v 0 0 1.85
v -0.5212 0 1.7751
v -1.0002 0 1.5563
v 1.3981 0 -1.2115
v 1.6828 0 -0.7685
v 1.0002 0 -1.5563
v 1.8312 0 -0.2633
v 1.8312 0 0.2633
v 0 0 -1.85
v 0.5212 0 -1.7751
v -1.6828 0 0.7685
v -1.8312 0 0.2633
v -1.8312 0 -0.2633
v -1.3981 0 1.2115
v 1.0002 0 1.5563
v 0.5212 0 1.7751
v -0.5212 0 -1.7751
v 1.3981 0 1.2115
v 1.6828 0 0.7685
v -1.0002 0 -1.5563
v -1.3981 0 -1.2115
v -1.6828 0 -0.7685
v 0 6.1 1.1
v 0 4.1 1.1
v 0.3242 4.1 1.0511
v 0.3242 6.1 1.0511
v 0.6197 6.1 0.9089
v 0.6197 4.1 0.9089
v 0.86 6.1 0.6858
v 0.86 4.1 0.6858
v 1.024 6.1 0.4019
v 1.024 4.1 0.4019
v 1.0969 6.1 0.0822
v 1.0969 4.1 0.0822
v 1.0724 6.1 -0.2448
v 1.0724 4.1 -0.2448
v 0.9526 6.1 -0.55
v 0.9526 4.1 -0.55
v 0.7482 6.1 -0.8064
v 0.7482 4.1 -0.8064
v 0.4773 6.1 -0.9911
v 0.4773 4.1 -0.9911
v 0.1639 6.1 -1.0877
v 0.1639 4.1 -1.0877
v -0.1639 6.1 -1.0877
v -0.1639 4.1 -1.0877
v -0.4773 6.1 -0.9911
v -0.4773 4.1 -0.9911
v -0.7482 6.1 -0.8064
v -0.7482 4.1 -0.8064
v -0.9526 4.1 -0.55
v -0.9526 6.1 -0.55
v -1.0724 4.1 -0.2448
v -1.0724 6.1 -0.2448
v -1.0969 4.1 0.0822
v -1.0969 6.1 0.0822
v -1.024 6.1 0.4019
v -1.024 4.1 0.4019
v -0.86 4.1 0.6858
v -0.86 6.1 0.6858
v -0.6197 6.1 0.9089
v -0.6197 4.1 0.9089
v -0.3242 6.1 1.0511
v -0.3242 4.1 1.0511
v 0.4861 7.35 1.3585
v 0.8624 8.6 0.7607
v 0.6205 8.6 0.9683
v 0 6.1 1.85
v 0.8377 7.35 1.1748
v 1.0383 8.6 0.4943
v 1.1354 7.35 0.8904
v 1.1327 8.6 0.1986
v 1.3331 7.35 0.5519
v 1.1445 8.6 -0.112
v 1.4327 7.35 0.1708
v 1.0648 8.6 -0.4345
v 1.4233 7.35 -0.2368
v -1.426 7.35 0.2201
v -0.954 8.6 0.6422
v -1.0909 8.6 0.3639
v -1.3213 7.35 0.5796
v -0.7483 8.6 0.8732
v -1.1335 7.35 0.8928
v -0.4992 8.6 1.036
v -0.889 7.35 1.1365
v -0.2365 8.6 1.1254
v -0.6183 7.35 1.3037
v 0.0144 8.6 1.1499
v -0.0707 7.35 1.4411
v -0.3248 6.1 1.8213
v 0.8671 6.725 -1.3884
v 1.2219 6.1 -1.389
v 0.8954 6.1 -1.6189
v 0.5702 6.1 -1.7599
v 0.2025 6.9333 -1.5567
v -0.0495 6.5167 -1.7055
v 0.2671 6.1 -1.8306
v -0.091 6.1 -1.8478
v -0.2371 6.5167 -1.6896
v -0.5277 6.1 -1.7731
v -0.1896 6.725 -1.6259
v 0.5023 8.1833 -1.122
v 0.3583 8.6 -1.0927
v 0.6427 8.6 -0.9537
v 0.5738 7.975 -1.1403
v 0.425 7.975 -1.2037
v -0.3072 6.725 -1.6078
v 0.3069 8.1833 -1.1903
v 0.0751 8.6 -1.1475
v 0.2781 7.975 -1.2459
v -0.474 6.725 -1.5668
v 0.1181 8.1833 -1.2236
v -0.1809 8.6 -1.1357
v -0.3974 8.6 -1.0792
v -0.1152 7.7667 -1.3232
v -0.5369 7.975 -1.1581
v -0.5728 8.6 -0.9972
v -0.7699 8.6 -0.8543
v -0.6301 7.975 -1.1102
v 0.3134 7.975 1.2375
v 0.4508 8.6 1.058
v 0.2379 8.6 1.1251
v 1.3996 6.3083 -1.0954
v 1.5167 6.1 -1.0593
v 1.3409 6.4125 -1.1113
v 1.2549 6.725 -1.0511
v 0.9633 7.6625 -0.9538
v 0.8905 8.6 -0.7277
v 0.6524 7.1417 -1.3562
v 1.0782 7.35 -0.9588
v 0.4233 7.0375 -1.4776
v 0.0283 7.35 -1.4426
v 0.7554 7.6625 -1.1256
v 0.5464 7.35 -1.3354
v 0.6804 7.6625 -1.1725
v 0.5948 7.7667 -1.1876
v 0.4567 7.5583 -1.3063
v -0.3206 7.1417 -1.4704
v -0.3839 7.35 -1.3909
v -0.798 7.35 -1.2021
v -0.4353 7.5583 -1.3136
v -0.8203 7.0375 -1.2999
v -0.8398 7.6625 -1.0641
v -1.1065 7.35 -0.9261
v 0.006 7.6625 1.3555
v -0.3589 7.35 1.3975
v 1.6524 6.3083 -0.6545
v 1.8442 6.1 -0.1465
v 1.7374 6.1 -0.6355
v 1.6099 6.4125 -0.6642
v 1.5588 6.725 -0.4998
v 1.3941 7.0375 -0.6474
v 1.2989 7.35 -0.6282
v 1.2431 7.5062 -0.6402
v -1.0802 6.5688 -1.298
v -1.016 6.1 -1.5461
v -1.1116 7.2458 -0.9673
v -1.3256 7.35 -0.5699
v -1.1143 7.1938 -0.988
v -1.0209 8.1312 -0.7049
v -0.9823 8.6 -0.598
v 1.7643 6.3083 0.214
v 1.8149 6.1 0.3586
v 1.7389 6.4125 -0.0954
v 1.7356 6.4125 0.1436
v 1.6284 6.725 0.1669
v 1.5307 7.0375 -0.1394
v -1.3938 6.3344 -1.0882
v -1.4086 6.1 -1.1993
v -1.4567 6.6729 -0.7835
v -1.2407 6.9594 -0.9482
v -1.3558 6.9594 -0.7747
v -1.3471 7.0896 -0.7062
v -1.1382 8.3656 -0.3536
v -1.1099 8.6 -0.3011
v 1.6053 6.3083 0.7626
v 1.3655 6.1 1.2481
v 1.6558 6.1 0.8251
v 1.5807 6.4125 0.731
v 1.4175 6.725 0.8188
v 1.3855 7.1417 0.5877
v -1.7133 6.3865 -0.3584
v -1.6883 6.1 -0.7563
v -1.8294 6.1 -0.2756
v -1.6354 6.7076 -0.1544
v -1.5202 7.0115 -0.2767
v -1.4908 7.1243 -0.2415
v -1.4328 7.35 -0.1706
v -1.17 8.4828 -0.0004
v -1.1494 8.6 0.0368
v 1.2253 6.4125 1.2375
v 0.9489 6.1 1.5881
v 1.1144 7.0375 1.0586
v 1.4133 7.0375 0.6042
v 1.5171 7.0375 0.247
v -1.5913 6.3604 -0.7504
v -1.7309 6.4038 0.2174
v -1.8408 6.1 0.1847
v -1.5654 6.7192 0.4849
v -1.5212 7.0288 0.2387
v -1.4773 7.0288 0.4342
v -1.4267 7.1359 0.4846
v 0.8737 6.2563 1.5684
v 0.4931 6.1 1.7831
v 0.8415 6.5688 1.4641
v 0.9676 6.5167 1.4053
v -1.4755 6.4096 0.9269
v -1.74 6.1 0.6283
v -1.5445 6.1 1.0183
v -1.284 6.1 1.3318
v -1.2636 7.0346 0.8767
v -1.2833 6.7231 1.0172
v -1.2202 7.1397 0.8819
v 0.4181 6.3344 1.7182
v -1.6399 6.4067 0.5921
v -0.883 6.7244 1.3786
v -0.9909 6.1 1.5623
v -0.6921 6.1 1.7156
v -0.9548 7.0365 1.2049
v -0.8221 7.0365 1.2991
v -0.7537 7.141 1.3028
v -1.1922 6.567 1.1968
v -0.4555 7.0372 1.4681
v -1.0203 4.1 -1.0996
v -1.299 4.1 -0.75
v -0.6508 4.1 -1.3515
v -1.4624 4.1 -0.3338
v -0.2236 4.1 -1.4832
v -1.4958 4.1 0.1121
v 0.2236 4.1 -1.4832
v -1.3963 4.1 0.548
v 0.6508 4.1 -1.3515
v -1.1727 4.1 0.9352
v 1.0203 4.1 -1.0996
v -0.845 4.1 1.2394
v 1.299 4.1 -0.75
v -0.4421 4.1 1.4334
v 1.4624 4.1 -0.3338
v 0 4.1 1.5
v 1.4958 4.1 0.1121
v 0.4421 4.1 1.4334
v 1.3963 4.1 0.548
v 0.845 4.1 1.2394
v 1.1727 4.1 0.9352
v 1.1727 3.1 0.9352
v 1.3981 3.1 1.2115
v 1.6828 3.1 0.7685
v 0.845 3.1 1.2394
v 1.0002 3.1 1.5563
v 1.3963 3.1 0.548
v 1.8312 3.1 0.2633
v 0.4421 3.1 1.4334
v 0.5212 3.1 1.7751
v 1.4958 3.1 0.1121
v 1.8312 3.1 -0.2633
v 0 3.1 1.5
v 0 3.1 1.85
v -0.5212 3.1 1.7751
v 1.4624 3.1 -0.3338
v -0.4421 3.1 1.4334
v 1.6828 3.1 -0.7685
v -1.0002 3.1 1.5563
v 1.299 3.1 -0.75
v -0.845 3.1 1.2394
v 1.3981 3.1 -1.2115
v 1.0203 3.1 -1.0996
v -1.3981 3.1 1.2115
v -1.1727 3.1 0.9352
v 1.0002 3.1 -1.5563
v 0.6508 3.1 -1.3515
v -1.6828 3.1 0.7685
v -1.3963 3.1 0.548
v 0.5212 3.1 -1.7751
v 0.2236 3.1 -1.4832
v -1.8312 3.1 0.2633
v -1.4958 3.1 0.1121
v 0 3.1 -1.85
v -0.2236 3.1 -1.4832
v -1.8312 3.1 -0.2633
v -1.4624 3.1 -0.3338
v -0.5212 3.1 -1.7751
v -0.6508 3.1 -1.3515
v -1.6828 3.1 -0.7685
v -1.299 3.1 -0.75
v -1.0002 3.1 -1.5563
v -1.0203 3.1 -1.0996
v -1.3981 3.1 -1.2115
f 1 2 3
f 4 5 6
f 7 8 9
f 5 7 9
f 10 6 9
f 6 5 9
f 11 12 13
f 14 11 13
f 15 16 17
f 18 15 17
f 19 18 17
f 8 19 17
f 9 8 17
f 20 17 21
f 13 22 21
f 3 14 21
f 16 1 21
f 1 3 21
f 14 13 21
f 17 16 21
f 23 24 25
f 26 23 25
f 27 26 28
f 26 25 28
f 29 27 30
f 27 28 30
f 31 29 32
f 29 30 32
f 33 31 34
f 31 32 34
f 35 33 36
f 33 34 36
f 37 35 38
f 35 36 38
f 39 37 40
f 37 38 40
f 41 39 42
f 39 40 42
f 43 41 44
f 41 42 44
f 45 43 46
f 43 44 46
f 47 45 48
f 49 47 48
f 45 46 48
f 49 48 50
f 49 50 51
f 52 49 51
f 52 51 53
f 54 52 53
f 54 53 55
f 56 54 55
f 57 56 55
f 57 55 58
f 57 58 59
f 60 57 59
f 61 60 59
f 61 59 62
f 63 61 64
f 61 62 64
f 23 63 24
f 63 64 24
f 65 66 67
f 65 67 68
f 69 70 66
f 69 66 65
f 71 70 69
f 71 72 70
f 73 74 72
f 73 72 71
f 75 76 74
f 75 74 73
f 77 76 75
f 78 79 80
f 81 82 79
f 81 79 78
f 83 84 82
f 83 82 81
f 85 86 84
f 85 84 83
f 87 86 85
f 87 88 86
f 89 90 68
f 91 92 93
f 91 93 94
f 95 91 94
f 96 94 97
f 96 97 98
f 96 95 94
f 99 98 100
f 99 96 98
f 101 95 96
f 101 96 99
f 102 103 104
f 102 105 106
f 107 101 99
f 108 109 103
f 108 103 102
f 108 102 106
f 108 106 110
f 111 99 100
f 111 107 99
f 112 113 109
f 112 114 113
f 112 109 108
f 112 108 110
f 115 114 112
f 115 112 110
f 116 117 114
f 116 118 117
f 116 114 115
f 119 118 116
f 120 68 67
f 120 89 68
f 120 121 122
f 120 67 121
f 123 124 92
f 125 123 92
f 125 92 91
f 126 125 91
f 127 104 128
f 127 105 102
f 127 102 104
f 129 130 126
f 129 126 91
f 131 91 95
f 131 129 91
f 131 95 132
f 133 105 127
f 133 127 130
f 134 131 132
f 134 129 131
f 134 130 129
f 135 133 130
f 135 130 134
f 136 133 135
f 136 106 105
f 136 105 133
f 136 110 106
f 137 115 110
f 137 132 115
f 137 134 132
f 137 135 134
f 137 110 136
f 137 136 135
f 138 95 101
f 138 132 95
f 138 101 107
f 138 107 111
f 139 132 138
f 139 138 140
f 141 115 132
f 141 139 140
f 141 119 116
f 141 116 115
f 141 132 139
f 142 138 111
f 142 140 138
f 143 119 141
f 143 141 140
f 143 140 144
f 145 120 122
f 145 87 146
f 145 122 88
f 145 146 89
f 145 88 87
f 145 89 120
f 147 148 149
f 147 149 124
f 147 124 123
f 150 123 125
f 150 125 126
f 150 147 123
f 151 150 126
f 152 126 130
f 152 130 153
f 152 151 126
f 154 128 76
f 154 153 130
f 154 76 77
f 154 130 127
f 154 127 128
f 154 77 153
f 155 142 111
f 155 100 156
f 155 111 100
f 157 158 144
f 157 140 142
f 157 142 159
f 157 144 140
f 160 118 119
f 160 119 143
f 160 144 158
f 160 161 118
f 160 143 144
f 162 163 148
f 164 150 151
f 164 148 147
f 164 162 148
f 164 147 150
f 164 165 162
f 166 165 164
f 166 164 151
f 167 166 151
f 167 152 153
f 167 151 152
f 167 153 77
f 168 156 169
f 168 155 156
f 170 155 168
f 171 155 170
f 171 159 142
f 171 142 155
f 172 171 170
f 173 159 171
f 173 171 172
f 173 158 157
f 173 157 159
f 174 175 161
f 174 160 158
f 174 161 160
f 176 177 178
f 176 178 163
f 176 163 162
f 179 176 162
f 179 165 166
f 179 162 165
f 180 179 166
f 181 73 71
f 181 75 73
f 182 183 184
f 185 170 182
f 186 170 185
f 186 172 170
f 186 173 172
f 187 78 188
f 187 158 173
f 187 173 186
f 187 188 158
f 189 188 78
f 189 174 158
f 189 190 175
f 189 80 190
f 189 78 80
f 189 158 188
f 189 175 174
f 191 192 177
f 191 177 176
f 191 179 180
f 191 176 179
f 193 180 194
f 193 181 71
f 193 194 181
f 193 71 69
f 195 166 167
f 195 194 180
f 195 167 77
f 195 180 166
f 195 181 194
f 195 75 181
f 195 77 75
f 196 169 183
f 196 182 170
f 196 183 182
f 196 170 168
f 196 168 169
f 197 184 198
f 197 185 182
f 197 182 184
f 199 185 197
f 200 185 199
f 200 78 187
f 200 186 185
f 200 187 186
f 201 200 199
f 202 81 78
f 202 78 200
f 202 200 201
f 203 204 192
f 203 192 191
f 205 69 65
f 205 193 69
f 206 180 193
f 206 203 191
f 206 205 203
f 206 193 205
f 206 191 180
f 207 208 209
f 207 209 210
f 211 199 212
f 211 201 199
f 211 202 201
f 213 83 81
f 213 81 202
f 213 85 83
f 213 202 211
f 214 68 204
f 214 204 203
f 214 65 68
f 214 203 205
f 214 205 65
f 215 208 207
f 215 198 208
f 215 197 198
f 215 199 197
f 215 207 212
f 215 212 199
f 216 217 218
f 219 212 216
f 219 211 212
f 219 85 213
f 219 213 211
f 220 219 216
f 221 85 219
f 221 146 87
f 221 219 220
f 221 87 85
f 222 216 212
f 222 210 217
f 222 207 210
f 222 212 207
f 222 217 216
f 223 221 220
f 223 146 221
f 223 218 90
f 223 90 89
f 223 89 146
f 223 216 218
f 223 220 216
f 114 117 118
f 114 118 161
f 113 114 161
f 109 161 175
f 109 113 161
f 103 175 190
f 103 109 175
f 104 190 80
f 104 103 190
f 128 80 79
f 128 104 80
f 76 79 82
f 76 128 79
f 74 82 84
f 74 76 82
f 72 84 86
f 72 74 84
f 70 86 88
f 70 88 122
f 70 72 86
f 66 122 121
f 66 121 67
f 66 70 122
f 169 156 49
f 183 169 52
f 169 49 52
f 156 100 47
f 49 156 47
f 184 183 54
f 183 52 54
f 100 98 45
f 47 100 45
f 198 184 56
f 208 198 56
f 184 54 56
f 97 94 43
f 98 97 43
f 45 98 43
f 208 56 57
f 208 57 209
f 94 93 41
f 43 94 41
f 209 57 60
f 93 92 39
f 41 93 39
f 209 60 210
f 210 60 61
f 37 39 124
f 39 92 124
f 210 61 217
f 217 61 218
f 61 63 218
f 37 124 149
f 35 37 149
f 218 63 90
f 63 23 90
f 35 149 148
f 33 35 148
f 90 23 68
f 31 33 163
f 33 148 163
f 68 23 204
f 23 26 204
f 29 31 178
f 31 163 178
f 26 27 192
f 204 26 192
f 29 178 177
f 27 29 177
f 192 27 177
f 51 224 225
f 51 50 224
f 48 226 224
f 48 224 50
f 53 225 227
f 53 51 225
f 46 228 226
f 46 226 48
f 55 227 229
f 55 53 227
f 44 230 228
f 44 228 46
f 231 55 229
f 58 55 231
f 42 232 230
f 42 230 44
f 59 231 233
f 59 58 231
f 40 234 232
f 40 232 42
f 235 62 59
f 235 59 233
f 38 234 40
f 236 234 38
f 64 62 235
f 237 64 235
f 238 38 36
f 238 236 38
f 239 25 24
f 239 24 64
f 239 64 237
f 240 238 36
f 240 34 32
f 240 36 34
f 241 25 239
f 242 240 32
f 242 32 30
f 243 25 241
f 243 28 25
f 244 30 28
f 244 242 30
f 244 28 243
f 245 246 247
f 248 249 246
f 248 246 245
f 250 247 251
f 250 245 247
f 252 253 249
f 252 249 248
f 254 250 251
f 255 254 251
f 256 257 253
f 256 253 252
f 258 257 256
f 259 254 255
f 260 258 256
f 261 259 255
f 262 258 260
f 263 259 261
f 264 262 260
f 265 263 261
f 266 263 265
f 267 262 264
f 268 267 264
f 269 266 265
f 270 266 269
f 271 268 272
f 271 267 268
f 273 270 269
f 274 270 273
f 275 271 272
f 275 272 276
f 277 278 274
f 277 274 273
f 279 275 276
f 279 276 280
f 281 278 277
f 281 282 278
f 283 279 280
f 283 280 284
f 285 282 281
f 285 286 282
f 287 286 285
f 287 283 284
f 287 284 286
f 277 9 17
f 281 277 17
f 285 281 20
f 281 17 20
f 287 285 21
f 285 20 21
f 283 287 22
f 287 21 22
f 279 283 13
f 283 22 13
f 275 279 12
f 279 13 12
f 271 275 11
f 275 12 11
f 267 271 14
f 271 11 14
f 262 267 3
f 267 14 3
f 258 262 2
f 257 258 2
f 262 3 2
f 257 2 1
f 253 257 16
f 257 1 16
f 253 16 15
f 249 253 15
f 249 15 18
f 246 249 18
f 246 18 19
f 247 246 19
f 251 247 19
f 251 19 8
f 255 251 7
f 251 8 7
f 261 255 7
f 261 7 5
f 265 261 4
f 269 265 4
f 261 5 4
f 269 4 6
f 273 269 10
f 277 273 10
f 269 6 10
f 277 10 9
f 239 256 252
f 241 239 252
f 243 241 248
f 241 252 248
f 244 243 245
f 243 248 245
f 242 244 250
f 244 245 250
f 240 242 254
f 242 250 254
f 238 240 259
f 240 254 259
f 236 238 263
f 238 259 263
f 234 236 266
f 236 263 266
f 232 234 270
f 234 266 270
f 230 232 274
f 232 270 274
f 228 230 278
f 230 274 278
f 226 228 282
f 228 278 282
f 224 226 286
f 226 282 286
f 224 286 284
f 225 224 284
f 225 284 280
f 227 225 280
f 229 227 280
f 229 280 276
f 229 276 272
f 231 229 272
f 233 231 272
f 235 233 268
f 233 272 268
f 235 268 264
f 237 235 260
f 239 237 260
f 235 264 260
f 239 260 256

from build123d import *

# Parameters (mm, degrees)
SKETCH1_R           = 1.85
BOSS_EXTRUDE1_DEPTH = 3.1
SKETCH2_R           = 1.5
BOSS_EXTRUDE2_DEPTH = 1
SKETCH3_R           = 1.1
BOSS_EXTRUDE3_DEPTH = 2


with BuildPart() as part:
    # Sketch1 → Boss-Extrude1 (new body)
    with BuildSketch(Plane(origin=(0, 0, 0), x_dir=(1, 0, 0), z_dir=(0, 1, 0))):
        with Locations(Location((0, 0, 0), (0, 0, 90))):
            Circle(SKETCH1_R)
    extrude(amount=BOSS_EXTRUDE1_DEPTH)

    # Sketch2 → Boss-Extrude2 (add)
    with BuildSketch(Plane(origin=(0, 3.1, 0), x_dir=(1, 0, 0), z_dir=(0, 1, 0))):
        with Locations(Location((0, 0, 0), (0, 0, 270))):
            Circle(SKETCH2_R)
    extrude(amount=BOSS_EXTRUDE2_DEPTH)

    # Sketch3 → Boss-Extrude3 (add)
    with BuildSketch(Plane(origin=(0, 4.1, 0), x_dir=(1, 0, 0), z_dir=(0, 1, 0))):
        with Locations(Location((0, 0, 0), (0, 0, 270))):
            Circle(SKETCH3_R)
    extrude(amount=BOSS_EXTRUDE3_DEPTH)

    # Loft1: read off the stored shape, not the designer's step
    # Loft1: loft between two sections, ruled curve by curve
    loft1_from = [
        Edge.make_bspline([(0, 6.1, 1.85), (3.7, 6.1, 1.85), (3.7, 6.1, -1.85), (0, 6.1, -1.85), (-3.7, 6.1, -1.85), (-3.7, 6.1, 1.85), (0, 6.1, 1.85)], [0, 0, 0, 0, 0.5, 0.5, 0.5, 1, 1, 1, 1], 3, [1, 0.333333333, 0.333333333, 1, 0.333333333, 0.333333333, 1]),
    ]
    loft1_to = [
        Edge.make_bspline([(0.620465421, 8.6, 0.968257539), (2.556980499, 8.6, -0.272673303), (1.316049657, 8.6, -2.209188381), (-0.620465421, 8.6, -0.968257539), (-2.556980499, 8.6, 0.272673303), (-1.316049657, 8.6, 2.209188381), (0.620465421, 8.6, 0.968257539)], [0, 0, 0, 0, 0.5, 0.5, 0.5, 1, 1, 1, 1], 3, [1, 0.333333333, 0.333333333, 1, 0.333333333, 0.333333333, 1]),
    ]
    loft1 = Solid(Shell([*[Face.make_surface_from_curves(loft1_from[k], loft1_to[k]) for k in range(1)], Face(Wire(loft1_from)), Face(Wire(loft1_to))]))
    add(loft1)


solid = part.part
